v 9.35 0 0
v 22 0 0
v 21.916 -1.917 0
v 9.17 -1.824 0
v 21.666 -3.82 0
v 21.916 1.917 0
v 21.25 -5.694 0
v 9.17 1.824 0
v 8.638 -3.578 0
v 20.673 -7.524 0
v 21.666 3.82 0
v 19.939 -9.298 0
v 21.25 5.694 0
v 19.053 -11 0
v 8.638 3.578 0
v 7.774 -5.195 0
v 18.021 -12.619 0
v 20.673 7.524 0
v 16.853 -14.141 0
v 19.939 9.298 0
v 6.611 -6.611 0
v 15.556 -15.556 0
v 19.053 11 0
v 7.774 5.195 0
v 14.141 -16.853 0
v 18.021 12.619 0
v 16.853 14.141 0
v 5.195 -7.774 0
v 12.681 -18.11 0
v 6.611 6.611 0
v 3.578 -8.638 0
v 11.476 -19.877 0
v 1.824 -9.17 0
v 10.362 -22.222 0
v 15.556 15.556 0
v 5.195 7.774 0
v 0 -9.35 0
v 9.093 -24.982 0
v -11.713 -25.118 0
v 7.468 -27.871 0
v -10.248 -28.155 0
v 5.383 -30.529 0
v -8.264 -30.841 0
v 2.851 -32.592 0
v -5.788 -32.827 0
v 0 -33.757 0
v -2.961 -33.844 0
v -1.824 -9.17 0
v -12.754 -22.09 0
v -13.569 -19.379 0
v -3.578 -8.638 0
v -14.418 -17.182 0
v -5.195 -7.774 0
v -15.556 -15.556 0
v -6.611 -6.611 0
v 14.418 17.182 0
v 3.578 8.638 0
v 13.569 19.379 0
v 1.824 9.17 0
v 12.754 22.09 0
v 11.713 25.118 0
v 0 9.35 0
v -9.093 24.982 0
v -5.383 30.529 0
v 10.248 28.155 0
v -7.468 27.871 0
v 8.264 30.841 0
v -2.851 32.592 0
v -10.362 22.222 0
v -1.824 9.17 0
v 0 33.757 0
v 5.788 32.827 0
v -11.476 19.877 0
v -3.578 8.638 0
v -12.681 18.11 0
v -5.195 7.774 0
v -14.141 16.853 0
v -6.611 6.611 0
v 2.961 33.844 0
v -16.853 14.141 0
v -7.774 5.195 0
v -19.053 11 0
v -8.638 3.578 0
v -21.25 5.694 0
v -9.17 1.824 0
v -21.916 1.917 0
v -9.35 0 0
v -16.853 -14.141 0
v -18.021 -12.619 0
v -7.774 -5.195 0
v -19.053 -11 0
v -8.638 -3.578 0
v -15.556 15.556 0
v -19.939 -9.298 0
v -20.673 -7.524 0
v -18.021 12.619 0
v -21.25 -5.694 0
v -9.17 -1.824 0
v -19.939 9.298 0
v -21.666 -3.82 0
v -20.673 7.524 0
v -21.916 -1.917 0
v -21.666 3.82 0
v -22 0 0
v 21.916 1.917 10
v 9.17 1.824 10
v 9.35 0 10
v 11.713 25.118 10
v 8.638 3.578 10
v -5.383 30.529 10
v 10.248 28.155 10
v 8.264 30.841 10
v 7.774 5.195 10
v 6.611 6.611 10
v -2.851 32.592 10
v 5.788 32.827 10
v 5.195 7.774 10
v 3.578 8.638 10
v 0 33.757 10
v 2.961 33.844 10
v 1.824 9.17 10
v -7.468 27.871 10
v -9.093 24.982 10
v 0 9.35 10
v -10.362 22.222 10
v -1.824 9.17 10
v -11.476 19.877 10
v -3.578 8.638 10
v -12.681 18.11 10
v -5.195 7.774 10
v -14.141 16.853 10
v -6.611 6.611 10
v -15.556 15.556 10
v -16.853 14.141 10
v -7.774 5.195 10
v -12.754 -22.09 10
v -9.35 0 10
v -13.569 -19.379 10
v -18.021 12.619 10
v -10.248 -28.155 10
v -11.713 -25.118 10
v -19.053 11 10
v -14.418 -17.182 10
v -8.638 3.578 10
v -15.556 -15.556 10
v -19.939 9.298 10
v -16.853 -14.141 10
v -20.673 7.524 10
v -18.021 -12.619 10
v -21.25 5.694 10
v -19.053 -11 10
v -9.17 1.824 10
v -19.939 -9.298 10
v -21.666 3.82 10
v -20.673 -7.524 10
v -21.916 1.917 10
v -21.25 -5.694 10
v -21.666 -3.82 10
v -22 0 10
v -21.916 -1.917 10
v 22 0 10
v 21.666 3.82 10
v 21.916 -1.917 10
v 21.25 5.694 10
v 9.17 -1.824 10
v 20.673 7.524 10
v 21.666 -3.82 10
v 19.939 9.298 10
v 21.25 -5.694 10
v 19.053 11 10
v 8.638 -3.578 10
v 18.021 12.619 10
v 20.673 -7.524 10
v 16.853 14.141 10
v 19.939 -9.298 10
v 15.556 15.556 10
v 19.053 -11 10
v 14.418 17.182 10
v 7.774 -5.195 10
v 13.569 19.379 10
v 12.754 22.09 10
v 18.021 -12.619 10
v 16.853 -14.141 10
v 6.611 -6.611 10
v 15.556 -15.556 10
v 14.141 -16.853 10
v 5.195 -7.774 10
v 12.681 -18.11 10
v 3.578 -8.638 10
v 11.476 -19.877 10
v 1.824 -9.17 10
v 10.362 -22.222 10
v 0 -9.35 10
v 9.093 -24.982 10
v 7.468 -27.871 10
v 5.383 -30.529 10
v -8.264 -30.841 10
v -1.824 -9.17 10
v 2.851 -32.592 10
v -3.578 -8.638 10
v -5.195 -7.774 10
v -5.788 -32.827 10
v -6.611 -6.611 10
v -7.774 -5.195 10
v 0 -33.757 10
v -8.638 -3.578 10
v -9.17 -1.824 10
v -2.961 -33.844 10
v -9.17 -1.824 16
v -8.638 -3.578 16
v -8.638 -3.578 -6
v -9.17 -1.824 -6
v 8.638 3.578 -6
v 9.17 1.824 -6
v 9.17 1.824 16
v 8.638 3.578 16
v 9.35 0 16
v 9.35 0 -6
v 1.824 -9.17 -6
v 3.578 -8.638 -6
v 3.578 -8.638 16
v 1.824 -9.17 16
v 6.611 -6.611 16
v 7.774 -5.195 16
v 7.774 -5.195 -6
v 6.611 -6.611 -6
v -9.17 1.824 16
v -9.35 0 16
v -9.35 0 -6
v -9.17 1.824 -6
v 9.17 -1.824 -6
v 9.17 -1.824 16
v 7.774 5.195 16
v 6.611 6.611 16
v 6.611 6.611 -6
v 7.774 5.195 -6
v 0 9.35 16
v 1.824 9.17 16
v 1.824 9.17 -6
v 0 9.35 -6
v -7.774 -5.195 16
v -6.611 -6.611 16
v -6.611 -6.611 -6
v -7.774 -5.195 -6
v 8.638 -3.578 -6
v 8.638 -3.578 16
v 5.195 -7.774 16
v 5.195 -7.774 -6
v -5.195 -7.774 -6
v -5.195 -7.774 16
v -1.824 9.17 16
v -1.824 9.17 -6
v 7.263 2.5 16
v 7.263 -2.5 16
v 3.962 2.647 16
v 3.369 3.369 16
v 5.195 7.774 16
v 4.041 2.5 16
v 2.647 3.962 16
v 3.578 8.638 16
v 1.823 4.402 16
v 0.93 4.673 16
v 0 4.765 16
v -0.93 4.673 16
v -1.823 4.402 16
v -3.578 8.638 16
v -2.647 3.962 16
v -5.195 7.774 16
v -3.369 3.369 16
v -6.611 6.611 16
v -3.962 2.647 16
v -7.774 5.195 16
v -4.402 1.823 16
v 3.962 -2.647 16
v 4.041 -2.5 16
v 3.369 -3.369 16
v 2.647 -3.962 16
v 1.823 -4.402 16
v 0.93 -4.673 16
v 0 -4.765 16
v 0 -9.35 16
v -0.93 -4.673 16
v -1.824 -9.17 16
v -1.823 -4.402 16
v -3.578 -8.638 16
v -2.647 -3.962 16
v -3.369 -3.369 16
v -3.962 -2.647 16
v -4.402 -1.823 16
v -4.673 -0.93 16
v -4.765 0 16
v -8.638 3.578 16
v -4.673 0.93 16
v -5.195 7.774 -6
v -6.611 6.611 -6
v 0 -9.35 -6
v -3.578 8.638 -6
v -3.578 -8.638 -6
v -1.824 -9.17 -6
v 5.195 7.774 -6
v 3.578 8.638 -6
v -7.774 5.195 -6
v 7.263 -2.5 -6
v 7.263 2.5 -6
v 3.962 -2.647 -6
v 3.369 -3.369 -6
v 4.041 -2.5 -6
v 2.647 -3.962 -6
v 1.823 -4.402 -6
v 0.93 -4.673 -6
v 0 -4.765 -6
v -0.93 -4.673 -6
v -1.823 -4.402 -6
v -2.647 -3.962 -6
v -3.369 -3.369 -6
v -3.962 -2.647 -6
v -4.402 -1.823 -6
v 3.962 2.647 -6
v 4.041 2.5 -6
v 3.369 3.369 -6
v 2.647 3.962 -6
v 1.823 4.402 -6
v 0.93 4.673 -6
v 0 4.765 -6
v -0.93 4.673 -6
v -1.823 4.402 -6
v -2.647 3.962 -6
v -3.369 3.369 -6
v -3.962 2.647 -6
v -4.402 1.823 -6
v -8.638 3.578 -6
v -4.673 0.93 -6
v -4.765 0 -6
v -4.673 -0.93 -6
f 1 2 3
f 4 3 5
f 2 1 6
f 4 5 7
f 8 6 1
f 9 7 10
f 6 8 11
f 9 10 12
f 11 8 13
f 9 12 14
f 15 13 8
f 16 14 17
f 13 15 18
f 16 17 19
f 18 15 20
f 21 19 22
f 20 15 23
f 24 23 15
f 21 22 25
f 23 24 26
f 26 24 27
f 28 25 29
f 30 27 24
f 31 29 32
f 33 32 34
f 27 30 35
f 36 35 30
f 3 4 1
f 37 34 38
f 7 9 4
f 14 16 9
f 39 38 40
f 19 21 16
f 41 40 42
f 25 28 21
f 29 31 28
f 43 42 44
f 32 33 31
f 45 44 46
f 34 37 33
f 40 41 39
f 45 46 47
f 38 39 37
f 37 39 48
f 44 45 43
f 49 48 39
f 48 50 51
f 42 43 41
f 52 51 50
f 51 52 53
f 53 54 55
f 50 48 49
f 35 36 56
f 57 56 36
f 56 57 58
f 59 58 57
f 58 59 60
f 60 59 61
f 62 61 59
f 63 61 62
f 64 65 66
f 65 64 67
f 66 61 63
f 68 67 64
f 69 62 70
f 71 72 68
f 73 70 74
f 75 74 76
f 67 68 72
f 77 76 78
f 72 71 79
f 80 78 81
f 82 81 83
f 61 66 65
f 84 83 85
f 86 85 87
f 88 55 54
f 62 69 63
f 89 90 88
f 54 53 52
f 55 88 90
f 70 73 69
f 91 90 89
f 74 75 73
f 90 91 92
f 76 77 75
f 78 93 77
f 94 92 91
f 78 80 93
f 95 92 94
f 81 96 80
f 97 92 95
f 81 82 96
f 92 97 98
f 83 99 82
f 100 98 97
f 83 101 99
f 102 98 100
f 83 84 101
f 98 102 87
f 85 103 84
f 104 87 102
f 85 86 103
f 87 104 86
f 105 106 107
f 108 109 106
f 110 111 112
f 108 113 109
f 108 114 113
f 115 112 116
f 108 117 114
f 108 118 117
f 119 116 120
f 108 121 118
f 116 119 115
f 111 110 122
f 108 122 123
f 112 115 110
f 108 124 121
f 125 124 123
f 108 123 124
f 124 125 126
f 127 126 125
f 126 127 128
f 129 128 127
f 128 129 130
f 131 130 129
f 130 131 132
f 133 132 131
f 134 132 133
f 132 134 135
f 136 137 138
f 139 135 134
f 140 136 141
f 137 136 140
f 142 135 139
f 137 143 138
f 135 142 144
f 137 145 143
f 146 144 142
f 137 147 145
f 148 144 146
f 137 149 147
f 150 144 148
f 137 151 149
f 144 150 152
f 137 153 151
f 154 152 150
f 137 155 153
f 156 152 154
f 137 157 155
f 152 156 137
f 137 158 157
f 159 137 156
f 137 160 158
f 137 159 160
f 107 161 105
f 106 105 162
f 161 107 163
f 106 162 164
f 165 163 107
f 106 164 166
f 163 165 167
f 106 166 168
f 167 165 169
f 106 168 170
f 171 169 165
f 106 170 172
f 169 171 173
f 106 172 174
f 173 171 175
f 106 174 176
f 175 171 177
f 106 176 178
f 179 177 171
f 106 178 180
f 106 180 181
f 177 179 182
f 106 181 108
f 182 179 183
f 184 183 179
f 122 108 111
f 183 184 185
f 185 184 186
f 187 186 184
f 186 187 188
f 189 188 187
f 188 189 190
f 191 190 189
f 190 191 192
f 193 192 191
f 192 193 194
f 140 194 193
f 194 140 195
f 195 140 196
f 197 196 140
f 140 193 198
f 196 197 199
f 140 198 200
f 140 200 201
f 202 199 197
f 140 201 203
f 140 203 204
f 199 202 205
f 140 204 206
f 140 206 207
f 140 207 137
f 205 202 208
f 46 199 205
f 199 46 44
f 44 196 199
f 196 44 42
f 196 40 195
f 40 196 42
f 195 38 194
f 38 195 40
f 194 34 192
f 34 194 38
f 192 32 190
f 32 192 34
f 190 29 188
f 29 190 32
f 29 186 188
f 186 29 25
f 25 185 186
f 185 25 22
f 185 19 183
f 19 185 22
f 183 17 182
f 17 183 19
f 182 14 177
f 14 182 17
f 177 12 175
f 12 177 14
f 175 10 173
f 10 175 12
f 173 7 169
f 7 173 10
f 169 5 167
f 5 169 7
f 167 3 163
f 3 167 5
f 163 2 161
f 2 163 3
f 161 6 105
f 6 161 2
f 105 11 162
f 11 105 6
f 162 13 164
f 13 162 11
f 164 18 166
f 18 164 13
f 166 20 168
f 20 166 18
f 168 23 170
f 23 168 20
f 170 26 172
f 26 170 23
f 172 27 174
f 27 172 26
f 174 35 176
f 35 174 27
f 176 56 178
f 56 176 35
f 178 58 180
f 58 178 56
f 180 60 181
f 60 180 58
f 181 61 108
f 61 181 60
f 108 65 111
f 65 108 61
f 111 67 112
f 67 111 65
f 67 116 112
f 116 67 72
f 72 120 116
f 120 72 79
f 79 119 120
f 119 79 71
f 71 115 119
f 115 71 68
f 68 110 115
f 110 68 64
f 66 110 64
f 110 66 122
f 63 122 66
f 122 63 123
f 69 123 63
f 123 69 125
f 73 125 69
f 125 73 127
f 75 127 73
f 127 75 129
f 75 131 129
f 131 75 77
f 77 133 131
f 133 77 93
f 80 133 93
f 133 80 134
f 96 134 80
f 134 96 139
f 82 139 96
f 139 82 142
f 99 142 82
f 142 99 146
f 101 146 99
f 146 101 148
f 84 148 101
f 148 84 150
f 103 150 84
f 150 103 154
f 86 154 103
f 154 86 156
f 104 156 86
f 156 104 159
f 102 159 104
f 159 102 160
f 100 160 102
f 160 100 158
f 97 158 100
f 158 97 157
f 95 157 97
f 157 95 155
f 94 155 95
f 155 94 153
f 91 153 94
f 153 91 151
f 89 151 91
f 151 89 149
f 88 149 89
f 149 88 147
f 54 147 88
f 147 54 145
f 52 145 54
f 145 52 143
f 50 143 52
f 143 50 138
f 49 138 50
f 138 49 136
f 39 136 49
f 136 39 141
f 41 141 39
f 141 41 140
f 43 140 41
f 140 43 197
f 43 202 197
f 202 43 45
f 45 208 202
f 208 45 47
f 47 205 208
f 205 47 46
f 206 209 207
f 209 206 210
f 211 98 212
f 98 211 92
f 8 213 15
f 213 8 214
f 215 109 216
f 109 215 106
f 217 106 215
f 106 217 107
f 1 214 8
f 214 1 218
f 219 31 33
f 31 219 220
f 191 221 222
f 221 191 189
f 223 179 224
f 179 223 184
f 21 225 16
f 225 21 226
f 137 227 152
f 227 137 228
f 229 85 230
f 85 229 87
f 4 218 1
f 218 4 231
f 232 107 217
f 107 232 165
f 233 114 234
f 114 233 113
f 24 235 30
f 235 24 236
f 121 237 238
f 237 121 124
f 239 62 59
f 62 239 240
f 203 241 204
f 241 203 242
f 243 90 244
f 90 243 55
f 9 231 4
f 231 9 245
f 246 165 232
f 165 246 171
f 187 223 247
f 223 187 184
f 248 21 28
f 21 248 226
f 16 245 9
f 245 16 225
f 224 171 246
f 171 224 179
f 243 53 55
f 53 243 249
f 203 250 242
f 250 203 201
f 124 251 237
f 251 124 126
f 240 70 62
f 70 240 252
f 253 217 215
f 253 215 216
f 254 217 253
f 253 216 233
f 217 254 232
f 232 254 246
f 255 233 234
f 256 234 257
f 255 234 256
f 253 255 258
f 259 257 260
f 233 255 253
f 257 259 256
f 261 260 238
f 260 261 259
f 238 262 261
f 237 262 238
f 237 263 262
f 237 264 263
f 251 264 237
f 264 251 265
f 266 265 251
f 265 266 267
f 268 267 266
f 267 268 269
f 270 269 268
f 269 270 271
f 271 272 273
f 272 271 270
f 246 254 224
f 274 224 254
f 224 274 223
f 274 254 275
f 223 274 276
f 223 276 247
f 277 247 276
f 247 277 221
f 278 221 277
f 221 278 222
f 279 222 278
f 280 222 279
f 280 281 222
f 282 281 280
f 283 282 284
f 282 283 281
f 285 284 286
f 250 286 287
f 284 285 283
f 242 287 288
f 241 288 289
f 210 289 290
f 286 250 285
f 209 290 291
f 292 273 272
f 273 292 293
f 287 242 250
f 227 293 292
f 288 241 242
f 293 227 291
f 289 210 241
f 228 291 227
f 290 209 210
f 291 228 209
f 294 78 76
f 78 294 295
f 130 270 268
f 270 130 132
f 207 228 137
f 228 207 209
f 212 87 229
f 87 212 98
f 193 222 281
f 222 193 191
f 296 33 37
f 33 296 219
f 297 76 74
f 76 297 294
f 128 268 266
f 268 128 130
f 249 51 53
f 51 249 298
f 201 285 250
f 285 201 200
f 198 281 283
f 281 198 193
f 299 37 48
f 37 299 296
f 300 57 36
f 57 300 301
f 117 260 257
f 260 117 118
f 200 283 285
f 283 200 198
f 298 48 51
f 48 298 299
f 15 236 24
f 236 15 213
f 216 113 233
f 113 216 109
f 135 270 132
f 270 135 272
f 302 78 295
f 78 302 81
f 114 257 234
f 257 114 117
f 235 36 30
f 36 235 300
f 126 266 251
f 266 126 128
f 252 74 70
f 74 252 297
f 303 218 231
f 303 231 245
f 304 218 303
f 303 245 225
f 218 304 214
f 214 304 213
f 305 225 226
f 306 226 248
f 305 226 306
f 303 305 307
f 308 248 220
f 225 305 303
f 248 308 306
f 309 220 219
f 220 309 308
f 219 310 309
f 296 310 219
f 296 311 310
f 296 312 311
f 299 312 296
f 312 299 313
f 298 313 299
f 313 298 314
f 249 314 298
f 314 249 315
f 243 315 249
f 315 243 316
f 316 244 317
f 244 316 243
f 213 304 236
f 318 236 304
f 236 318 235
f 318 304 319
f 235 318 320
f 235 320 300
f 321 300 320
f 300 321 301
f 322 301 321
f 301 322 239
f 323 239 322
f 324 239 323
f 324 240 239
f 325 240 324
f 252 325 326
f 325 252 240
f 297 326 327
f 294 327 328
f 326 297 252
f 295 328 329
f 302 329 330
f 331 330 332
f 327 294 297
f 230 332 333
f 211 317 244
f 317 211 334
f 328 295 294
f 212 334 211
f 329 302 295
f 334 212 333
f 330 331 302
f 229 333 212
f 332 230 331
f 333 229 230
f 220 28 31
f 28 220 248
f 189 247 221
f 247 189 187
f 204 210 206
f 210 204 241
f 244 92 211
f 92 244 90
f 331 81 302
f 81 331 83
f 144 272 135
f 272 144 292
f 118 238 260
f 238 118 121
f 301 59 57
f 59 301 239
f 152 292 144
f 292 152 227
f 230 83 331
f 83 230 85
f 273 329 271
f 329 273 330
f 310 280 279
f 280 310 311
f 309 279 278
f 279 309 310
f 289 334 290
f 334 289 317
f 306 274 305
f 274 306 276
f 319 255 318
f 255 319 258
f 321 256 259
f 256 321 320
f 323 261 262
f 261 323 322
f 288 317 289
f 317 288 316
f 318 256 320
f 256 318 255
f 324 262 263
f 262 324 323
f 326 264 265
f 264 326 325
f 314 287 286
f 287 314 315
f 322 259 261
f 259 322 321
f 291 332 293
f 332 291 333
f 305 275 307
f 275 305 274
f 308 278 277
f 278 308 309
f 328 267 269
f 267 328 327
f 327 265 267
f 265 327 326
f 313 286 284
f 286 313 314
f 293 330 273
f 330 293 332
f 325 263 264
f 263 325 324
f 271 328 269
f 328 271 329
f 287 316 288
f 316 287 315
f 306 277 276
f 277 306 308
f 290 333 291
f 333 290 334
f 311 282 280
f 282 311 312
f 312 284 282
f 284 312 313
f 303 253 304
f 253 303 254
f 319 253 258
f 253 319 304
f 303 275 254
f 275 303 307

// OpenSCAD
$fn = 32;

// ----------------------------------------------------------------------
// Cam: base radius 22 mm with a 12 mm lift over 150 degrees
// ----------------------------------------------------------------------

// --- parameters (mm) ---
base_r = 22;              // base radius
lift = 12;                // lift height above the base radius
lift_span = 150;          // angular width of the lift
lift_start = 45;          // angle where the lift starts
cam_t = 10;               // cam plate thickness
hub_d = 18.7;             // hub diameter
hub_h = 22;               // hub height
bore_d = 9.53;            // bore
key_w = 5;                // keyway width
key_depth = 2.5;          // keyway depth

cam_profile = [[22, 0], [21.916, 1.917], [21.666, 3.82], [21.25, 5.694], [20.673, 7.524], [19.939, 9.298], [19.053, 11], [18.021, 12.619], [16.853, 14.141], [15.556, 15.556], [14.418, 17.182], [13.569, 19.379], [12.754, 22.09], [11.713, 25.118], [10.248, 28.155], [8.264, 30.841], [5.788, 32.827], [2.961, 33.844], [0, 33.757], [-2.851, 32.592], [-5.383, 30.529], [-7.468, 27.871], [-9.093, 24.982], [-10.362, 22.222], [-11.476, 19.877], [-12.681, 18.11], [-14.141, 16.853], [-15.556, 15.556], [-16.853, 14.141], [-18.021, 12.619], [-19.053, 11], [-19.939, 9.298], [-20.673, 7.524], [-21.25, 5.694], [-21.666, 3.82], [-21.916, 1.917], [-22, 0], [-21.916, -1.917], [-21.666, -3.82], [-21.25, -5.694], [-20.673, -7.524], [-19.939, -9.298], [-19.053, -11], [-18.021, -12.619], [-16.853, -14.141], [-15.556, -15.556], [-14.418, -17.182], [-13.569, -19.379], [-12.754, -22.09], [-11.713, -25.118], [-10.248, -28.155], [-8.264, -30.841], [-5.788, -32.827], [-2.961, -33.844], [0, -33.757], [2.851, -32.592], [5.383, -30.529], [7.468, -27.871], [9.093, -24.982], [10.362, -22.222], [11.476, -19.877], [12.681, -18.11], [14.141, -16.853], [15.556, -15.556], [16.853, -14.141], [18.021, -12.619], [19.053, -11], [19.939, -9.298], [20.673, -7.524], [21.25, -5.694], [21.666, -3.82], [21.916, -1.917]];

difference() {
  union() {
    linear_extrude(height = cam_t) polygon(cam_profile);
    /* hub, proud of the cam plate on both sides */
    translate([0, 0, -6]) cylinder(h = hub_h, d = hub_d);
  }
  /* bore through the hub, 2.5 mm clear on both faces */
  translate([0, 0, -8.5]) cylinder(h = hub_h + 5, d = bore_d);
  /* keyway, milled through the whole hub */
  translate([2.263, -2.5, -8.5]) cube([5, 5, 27]);
}
